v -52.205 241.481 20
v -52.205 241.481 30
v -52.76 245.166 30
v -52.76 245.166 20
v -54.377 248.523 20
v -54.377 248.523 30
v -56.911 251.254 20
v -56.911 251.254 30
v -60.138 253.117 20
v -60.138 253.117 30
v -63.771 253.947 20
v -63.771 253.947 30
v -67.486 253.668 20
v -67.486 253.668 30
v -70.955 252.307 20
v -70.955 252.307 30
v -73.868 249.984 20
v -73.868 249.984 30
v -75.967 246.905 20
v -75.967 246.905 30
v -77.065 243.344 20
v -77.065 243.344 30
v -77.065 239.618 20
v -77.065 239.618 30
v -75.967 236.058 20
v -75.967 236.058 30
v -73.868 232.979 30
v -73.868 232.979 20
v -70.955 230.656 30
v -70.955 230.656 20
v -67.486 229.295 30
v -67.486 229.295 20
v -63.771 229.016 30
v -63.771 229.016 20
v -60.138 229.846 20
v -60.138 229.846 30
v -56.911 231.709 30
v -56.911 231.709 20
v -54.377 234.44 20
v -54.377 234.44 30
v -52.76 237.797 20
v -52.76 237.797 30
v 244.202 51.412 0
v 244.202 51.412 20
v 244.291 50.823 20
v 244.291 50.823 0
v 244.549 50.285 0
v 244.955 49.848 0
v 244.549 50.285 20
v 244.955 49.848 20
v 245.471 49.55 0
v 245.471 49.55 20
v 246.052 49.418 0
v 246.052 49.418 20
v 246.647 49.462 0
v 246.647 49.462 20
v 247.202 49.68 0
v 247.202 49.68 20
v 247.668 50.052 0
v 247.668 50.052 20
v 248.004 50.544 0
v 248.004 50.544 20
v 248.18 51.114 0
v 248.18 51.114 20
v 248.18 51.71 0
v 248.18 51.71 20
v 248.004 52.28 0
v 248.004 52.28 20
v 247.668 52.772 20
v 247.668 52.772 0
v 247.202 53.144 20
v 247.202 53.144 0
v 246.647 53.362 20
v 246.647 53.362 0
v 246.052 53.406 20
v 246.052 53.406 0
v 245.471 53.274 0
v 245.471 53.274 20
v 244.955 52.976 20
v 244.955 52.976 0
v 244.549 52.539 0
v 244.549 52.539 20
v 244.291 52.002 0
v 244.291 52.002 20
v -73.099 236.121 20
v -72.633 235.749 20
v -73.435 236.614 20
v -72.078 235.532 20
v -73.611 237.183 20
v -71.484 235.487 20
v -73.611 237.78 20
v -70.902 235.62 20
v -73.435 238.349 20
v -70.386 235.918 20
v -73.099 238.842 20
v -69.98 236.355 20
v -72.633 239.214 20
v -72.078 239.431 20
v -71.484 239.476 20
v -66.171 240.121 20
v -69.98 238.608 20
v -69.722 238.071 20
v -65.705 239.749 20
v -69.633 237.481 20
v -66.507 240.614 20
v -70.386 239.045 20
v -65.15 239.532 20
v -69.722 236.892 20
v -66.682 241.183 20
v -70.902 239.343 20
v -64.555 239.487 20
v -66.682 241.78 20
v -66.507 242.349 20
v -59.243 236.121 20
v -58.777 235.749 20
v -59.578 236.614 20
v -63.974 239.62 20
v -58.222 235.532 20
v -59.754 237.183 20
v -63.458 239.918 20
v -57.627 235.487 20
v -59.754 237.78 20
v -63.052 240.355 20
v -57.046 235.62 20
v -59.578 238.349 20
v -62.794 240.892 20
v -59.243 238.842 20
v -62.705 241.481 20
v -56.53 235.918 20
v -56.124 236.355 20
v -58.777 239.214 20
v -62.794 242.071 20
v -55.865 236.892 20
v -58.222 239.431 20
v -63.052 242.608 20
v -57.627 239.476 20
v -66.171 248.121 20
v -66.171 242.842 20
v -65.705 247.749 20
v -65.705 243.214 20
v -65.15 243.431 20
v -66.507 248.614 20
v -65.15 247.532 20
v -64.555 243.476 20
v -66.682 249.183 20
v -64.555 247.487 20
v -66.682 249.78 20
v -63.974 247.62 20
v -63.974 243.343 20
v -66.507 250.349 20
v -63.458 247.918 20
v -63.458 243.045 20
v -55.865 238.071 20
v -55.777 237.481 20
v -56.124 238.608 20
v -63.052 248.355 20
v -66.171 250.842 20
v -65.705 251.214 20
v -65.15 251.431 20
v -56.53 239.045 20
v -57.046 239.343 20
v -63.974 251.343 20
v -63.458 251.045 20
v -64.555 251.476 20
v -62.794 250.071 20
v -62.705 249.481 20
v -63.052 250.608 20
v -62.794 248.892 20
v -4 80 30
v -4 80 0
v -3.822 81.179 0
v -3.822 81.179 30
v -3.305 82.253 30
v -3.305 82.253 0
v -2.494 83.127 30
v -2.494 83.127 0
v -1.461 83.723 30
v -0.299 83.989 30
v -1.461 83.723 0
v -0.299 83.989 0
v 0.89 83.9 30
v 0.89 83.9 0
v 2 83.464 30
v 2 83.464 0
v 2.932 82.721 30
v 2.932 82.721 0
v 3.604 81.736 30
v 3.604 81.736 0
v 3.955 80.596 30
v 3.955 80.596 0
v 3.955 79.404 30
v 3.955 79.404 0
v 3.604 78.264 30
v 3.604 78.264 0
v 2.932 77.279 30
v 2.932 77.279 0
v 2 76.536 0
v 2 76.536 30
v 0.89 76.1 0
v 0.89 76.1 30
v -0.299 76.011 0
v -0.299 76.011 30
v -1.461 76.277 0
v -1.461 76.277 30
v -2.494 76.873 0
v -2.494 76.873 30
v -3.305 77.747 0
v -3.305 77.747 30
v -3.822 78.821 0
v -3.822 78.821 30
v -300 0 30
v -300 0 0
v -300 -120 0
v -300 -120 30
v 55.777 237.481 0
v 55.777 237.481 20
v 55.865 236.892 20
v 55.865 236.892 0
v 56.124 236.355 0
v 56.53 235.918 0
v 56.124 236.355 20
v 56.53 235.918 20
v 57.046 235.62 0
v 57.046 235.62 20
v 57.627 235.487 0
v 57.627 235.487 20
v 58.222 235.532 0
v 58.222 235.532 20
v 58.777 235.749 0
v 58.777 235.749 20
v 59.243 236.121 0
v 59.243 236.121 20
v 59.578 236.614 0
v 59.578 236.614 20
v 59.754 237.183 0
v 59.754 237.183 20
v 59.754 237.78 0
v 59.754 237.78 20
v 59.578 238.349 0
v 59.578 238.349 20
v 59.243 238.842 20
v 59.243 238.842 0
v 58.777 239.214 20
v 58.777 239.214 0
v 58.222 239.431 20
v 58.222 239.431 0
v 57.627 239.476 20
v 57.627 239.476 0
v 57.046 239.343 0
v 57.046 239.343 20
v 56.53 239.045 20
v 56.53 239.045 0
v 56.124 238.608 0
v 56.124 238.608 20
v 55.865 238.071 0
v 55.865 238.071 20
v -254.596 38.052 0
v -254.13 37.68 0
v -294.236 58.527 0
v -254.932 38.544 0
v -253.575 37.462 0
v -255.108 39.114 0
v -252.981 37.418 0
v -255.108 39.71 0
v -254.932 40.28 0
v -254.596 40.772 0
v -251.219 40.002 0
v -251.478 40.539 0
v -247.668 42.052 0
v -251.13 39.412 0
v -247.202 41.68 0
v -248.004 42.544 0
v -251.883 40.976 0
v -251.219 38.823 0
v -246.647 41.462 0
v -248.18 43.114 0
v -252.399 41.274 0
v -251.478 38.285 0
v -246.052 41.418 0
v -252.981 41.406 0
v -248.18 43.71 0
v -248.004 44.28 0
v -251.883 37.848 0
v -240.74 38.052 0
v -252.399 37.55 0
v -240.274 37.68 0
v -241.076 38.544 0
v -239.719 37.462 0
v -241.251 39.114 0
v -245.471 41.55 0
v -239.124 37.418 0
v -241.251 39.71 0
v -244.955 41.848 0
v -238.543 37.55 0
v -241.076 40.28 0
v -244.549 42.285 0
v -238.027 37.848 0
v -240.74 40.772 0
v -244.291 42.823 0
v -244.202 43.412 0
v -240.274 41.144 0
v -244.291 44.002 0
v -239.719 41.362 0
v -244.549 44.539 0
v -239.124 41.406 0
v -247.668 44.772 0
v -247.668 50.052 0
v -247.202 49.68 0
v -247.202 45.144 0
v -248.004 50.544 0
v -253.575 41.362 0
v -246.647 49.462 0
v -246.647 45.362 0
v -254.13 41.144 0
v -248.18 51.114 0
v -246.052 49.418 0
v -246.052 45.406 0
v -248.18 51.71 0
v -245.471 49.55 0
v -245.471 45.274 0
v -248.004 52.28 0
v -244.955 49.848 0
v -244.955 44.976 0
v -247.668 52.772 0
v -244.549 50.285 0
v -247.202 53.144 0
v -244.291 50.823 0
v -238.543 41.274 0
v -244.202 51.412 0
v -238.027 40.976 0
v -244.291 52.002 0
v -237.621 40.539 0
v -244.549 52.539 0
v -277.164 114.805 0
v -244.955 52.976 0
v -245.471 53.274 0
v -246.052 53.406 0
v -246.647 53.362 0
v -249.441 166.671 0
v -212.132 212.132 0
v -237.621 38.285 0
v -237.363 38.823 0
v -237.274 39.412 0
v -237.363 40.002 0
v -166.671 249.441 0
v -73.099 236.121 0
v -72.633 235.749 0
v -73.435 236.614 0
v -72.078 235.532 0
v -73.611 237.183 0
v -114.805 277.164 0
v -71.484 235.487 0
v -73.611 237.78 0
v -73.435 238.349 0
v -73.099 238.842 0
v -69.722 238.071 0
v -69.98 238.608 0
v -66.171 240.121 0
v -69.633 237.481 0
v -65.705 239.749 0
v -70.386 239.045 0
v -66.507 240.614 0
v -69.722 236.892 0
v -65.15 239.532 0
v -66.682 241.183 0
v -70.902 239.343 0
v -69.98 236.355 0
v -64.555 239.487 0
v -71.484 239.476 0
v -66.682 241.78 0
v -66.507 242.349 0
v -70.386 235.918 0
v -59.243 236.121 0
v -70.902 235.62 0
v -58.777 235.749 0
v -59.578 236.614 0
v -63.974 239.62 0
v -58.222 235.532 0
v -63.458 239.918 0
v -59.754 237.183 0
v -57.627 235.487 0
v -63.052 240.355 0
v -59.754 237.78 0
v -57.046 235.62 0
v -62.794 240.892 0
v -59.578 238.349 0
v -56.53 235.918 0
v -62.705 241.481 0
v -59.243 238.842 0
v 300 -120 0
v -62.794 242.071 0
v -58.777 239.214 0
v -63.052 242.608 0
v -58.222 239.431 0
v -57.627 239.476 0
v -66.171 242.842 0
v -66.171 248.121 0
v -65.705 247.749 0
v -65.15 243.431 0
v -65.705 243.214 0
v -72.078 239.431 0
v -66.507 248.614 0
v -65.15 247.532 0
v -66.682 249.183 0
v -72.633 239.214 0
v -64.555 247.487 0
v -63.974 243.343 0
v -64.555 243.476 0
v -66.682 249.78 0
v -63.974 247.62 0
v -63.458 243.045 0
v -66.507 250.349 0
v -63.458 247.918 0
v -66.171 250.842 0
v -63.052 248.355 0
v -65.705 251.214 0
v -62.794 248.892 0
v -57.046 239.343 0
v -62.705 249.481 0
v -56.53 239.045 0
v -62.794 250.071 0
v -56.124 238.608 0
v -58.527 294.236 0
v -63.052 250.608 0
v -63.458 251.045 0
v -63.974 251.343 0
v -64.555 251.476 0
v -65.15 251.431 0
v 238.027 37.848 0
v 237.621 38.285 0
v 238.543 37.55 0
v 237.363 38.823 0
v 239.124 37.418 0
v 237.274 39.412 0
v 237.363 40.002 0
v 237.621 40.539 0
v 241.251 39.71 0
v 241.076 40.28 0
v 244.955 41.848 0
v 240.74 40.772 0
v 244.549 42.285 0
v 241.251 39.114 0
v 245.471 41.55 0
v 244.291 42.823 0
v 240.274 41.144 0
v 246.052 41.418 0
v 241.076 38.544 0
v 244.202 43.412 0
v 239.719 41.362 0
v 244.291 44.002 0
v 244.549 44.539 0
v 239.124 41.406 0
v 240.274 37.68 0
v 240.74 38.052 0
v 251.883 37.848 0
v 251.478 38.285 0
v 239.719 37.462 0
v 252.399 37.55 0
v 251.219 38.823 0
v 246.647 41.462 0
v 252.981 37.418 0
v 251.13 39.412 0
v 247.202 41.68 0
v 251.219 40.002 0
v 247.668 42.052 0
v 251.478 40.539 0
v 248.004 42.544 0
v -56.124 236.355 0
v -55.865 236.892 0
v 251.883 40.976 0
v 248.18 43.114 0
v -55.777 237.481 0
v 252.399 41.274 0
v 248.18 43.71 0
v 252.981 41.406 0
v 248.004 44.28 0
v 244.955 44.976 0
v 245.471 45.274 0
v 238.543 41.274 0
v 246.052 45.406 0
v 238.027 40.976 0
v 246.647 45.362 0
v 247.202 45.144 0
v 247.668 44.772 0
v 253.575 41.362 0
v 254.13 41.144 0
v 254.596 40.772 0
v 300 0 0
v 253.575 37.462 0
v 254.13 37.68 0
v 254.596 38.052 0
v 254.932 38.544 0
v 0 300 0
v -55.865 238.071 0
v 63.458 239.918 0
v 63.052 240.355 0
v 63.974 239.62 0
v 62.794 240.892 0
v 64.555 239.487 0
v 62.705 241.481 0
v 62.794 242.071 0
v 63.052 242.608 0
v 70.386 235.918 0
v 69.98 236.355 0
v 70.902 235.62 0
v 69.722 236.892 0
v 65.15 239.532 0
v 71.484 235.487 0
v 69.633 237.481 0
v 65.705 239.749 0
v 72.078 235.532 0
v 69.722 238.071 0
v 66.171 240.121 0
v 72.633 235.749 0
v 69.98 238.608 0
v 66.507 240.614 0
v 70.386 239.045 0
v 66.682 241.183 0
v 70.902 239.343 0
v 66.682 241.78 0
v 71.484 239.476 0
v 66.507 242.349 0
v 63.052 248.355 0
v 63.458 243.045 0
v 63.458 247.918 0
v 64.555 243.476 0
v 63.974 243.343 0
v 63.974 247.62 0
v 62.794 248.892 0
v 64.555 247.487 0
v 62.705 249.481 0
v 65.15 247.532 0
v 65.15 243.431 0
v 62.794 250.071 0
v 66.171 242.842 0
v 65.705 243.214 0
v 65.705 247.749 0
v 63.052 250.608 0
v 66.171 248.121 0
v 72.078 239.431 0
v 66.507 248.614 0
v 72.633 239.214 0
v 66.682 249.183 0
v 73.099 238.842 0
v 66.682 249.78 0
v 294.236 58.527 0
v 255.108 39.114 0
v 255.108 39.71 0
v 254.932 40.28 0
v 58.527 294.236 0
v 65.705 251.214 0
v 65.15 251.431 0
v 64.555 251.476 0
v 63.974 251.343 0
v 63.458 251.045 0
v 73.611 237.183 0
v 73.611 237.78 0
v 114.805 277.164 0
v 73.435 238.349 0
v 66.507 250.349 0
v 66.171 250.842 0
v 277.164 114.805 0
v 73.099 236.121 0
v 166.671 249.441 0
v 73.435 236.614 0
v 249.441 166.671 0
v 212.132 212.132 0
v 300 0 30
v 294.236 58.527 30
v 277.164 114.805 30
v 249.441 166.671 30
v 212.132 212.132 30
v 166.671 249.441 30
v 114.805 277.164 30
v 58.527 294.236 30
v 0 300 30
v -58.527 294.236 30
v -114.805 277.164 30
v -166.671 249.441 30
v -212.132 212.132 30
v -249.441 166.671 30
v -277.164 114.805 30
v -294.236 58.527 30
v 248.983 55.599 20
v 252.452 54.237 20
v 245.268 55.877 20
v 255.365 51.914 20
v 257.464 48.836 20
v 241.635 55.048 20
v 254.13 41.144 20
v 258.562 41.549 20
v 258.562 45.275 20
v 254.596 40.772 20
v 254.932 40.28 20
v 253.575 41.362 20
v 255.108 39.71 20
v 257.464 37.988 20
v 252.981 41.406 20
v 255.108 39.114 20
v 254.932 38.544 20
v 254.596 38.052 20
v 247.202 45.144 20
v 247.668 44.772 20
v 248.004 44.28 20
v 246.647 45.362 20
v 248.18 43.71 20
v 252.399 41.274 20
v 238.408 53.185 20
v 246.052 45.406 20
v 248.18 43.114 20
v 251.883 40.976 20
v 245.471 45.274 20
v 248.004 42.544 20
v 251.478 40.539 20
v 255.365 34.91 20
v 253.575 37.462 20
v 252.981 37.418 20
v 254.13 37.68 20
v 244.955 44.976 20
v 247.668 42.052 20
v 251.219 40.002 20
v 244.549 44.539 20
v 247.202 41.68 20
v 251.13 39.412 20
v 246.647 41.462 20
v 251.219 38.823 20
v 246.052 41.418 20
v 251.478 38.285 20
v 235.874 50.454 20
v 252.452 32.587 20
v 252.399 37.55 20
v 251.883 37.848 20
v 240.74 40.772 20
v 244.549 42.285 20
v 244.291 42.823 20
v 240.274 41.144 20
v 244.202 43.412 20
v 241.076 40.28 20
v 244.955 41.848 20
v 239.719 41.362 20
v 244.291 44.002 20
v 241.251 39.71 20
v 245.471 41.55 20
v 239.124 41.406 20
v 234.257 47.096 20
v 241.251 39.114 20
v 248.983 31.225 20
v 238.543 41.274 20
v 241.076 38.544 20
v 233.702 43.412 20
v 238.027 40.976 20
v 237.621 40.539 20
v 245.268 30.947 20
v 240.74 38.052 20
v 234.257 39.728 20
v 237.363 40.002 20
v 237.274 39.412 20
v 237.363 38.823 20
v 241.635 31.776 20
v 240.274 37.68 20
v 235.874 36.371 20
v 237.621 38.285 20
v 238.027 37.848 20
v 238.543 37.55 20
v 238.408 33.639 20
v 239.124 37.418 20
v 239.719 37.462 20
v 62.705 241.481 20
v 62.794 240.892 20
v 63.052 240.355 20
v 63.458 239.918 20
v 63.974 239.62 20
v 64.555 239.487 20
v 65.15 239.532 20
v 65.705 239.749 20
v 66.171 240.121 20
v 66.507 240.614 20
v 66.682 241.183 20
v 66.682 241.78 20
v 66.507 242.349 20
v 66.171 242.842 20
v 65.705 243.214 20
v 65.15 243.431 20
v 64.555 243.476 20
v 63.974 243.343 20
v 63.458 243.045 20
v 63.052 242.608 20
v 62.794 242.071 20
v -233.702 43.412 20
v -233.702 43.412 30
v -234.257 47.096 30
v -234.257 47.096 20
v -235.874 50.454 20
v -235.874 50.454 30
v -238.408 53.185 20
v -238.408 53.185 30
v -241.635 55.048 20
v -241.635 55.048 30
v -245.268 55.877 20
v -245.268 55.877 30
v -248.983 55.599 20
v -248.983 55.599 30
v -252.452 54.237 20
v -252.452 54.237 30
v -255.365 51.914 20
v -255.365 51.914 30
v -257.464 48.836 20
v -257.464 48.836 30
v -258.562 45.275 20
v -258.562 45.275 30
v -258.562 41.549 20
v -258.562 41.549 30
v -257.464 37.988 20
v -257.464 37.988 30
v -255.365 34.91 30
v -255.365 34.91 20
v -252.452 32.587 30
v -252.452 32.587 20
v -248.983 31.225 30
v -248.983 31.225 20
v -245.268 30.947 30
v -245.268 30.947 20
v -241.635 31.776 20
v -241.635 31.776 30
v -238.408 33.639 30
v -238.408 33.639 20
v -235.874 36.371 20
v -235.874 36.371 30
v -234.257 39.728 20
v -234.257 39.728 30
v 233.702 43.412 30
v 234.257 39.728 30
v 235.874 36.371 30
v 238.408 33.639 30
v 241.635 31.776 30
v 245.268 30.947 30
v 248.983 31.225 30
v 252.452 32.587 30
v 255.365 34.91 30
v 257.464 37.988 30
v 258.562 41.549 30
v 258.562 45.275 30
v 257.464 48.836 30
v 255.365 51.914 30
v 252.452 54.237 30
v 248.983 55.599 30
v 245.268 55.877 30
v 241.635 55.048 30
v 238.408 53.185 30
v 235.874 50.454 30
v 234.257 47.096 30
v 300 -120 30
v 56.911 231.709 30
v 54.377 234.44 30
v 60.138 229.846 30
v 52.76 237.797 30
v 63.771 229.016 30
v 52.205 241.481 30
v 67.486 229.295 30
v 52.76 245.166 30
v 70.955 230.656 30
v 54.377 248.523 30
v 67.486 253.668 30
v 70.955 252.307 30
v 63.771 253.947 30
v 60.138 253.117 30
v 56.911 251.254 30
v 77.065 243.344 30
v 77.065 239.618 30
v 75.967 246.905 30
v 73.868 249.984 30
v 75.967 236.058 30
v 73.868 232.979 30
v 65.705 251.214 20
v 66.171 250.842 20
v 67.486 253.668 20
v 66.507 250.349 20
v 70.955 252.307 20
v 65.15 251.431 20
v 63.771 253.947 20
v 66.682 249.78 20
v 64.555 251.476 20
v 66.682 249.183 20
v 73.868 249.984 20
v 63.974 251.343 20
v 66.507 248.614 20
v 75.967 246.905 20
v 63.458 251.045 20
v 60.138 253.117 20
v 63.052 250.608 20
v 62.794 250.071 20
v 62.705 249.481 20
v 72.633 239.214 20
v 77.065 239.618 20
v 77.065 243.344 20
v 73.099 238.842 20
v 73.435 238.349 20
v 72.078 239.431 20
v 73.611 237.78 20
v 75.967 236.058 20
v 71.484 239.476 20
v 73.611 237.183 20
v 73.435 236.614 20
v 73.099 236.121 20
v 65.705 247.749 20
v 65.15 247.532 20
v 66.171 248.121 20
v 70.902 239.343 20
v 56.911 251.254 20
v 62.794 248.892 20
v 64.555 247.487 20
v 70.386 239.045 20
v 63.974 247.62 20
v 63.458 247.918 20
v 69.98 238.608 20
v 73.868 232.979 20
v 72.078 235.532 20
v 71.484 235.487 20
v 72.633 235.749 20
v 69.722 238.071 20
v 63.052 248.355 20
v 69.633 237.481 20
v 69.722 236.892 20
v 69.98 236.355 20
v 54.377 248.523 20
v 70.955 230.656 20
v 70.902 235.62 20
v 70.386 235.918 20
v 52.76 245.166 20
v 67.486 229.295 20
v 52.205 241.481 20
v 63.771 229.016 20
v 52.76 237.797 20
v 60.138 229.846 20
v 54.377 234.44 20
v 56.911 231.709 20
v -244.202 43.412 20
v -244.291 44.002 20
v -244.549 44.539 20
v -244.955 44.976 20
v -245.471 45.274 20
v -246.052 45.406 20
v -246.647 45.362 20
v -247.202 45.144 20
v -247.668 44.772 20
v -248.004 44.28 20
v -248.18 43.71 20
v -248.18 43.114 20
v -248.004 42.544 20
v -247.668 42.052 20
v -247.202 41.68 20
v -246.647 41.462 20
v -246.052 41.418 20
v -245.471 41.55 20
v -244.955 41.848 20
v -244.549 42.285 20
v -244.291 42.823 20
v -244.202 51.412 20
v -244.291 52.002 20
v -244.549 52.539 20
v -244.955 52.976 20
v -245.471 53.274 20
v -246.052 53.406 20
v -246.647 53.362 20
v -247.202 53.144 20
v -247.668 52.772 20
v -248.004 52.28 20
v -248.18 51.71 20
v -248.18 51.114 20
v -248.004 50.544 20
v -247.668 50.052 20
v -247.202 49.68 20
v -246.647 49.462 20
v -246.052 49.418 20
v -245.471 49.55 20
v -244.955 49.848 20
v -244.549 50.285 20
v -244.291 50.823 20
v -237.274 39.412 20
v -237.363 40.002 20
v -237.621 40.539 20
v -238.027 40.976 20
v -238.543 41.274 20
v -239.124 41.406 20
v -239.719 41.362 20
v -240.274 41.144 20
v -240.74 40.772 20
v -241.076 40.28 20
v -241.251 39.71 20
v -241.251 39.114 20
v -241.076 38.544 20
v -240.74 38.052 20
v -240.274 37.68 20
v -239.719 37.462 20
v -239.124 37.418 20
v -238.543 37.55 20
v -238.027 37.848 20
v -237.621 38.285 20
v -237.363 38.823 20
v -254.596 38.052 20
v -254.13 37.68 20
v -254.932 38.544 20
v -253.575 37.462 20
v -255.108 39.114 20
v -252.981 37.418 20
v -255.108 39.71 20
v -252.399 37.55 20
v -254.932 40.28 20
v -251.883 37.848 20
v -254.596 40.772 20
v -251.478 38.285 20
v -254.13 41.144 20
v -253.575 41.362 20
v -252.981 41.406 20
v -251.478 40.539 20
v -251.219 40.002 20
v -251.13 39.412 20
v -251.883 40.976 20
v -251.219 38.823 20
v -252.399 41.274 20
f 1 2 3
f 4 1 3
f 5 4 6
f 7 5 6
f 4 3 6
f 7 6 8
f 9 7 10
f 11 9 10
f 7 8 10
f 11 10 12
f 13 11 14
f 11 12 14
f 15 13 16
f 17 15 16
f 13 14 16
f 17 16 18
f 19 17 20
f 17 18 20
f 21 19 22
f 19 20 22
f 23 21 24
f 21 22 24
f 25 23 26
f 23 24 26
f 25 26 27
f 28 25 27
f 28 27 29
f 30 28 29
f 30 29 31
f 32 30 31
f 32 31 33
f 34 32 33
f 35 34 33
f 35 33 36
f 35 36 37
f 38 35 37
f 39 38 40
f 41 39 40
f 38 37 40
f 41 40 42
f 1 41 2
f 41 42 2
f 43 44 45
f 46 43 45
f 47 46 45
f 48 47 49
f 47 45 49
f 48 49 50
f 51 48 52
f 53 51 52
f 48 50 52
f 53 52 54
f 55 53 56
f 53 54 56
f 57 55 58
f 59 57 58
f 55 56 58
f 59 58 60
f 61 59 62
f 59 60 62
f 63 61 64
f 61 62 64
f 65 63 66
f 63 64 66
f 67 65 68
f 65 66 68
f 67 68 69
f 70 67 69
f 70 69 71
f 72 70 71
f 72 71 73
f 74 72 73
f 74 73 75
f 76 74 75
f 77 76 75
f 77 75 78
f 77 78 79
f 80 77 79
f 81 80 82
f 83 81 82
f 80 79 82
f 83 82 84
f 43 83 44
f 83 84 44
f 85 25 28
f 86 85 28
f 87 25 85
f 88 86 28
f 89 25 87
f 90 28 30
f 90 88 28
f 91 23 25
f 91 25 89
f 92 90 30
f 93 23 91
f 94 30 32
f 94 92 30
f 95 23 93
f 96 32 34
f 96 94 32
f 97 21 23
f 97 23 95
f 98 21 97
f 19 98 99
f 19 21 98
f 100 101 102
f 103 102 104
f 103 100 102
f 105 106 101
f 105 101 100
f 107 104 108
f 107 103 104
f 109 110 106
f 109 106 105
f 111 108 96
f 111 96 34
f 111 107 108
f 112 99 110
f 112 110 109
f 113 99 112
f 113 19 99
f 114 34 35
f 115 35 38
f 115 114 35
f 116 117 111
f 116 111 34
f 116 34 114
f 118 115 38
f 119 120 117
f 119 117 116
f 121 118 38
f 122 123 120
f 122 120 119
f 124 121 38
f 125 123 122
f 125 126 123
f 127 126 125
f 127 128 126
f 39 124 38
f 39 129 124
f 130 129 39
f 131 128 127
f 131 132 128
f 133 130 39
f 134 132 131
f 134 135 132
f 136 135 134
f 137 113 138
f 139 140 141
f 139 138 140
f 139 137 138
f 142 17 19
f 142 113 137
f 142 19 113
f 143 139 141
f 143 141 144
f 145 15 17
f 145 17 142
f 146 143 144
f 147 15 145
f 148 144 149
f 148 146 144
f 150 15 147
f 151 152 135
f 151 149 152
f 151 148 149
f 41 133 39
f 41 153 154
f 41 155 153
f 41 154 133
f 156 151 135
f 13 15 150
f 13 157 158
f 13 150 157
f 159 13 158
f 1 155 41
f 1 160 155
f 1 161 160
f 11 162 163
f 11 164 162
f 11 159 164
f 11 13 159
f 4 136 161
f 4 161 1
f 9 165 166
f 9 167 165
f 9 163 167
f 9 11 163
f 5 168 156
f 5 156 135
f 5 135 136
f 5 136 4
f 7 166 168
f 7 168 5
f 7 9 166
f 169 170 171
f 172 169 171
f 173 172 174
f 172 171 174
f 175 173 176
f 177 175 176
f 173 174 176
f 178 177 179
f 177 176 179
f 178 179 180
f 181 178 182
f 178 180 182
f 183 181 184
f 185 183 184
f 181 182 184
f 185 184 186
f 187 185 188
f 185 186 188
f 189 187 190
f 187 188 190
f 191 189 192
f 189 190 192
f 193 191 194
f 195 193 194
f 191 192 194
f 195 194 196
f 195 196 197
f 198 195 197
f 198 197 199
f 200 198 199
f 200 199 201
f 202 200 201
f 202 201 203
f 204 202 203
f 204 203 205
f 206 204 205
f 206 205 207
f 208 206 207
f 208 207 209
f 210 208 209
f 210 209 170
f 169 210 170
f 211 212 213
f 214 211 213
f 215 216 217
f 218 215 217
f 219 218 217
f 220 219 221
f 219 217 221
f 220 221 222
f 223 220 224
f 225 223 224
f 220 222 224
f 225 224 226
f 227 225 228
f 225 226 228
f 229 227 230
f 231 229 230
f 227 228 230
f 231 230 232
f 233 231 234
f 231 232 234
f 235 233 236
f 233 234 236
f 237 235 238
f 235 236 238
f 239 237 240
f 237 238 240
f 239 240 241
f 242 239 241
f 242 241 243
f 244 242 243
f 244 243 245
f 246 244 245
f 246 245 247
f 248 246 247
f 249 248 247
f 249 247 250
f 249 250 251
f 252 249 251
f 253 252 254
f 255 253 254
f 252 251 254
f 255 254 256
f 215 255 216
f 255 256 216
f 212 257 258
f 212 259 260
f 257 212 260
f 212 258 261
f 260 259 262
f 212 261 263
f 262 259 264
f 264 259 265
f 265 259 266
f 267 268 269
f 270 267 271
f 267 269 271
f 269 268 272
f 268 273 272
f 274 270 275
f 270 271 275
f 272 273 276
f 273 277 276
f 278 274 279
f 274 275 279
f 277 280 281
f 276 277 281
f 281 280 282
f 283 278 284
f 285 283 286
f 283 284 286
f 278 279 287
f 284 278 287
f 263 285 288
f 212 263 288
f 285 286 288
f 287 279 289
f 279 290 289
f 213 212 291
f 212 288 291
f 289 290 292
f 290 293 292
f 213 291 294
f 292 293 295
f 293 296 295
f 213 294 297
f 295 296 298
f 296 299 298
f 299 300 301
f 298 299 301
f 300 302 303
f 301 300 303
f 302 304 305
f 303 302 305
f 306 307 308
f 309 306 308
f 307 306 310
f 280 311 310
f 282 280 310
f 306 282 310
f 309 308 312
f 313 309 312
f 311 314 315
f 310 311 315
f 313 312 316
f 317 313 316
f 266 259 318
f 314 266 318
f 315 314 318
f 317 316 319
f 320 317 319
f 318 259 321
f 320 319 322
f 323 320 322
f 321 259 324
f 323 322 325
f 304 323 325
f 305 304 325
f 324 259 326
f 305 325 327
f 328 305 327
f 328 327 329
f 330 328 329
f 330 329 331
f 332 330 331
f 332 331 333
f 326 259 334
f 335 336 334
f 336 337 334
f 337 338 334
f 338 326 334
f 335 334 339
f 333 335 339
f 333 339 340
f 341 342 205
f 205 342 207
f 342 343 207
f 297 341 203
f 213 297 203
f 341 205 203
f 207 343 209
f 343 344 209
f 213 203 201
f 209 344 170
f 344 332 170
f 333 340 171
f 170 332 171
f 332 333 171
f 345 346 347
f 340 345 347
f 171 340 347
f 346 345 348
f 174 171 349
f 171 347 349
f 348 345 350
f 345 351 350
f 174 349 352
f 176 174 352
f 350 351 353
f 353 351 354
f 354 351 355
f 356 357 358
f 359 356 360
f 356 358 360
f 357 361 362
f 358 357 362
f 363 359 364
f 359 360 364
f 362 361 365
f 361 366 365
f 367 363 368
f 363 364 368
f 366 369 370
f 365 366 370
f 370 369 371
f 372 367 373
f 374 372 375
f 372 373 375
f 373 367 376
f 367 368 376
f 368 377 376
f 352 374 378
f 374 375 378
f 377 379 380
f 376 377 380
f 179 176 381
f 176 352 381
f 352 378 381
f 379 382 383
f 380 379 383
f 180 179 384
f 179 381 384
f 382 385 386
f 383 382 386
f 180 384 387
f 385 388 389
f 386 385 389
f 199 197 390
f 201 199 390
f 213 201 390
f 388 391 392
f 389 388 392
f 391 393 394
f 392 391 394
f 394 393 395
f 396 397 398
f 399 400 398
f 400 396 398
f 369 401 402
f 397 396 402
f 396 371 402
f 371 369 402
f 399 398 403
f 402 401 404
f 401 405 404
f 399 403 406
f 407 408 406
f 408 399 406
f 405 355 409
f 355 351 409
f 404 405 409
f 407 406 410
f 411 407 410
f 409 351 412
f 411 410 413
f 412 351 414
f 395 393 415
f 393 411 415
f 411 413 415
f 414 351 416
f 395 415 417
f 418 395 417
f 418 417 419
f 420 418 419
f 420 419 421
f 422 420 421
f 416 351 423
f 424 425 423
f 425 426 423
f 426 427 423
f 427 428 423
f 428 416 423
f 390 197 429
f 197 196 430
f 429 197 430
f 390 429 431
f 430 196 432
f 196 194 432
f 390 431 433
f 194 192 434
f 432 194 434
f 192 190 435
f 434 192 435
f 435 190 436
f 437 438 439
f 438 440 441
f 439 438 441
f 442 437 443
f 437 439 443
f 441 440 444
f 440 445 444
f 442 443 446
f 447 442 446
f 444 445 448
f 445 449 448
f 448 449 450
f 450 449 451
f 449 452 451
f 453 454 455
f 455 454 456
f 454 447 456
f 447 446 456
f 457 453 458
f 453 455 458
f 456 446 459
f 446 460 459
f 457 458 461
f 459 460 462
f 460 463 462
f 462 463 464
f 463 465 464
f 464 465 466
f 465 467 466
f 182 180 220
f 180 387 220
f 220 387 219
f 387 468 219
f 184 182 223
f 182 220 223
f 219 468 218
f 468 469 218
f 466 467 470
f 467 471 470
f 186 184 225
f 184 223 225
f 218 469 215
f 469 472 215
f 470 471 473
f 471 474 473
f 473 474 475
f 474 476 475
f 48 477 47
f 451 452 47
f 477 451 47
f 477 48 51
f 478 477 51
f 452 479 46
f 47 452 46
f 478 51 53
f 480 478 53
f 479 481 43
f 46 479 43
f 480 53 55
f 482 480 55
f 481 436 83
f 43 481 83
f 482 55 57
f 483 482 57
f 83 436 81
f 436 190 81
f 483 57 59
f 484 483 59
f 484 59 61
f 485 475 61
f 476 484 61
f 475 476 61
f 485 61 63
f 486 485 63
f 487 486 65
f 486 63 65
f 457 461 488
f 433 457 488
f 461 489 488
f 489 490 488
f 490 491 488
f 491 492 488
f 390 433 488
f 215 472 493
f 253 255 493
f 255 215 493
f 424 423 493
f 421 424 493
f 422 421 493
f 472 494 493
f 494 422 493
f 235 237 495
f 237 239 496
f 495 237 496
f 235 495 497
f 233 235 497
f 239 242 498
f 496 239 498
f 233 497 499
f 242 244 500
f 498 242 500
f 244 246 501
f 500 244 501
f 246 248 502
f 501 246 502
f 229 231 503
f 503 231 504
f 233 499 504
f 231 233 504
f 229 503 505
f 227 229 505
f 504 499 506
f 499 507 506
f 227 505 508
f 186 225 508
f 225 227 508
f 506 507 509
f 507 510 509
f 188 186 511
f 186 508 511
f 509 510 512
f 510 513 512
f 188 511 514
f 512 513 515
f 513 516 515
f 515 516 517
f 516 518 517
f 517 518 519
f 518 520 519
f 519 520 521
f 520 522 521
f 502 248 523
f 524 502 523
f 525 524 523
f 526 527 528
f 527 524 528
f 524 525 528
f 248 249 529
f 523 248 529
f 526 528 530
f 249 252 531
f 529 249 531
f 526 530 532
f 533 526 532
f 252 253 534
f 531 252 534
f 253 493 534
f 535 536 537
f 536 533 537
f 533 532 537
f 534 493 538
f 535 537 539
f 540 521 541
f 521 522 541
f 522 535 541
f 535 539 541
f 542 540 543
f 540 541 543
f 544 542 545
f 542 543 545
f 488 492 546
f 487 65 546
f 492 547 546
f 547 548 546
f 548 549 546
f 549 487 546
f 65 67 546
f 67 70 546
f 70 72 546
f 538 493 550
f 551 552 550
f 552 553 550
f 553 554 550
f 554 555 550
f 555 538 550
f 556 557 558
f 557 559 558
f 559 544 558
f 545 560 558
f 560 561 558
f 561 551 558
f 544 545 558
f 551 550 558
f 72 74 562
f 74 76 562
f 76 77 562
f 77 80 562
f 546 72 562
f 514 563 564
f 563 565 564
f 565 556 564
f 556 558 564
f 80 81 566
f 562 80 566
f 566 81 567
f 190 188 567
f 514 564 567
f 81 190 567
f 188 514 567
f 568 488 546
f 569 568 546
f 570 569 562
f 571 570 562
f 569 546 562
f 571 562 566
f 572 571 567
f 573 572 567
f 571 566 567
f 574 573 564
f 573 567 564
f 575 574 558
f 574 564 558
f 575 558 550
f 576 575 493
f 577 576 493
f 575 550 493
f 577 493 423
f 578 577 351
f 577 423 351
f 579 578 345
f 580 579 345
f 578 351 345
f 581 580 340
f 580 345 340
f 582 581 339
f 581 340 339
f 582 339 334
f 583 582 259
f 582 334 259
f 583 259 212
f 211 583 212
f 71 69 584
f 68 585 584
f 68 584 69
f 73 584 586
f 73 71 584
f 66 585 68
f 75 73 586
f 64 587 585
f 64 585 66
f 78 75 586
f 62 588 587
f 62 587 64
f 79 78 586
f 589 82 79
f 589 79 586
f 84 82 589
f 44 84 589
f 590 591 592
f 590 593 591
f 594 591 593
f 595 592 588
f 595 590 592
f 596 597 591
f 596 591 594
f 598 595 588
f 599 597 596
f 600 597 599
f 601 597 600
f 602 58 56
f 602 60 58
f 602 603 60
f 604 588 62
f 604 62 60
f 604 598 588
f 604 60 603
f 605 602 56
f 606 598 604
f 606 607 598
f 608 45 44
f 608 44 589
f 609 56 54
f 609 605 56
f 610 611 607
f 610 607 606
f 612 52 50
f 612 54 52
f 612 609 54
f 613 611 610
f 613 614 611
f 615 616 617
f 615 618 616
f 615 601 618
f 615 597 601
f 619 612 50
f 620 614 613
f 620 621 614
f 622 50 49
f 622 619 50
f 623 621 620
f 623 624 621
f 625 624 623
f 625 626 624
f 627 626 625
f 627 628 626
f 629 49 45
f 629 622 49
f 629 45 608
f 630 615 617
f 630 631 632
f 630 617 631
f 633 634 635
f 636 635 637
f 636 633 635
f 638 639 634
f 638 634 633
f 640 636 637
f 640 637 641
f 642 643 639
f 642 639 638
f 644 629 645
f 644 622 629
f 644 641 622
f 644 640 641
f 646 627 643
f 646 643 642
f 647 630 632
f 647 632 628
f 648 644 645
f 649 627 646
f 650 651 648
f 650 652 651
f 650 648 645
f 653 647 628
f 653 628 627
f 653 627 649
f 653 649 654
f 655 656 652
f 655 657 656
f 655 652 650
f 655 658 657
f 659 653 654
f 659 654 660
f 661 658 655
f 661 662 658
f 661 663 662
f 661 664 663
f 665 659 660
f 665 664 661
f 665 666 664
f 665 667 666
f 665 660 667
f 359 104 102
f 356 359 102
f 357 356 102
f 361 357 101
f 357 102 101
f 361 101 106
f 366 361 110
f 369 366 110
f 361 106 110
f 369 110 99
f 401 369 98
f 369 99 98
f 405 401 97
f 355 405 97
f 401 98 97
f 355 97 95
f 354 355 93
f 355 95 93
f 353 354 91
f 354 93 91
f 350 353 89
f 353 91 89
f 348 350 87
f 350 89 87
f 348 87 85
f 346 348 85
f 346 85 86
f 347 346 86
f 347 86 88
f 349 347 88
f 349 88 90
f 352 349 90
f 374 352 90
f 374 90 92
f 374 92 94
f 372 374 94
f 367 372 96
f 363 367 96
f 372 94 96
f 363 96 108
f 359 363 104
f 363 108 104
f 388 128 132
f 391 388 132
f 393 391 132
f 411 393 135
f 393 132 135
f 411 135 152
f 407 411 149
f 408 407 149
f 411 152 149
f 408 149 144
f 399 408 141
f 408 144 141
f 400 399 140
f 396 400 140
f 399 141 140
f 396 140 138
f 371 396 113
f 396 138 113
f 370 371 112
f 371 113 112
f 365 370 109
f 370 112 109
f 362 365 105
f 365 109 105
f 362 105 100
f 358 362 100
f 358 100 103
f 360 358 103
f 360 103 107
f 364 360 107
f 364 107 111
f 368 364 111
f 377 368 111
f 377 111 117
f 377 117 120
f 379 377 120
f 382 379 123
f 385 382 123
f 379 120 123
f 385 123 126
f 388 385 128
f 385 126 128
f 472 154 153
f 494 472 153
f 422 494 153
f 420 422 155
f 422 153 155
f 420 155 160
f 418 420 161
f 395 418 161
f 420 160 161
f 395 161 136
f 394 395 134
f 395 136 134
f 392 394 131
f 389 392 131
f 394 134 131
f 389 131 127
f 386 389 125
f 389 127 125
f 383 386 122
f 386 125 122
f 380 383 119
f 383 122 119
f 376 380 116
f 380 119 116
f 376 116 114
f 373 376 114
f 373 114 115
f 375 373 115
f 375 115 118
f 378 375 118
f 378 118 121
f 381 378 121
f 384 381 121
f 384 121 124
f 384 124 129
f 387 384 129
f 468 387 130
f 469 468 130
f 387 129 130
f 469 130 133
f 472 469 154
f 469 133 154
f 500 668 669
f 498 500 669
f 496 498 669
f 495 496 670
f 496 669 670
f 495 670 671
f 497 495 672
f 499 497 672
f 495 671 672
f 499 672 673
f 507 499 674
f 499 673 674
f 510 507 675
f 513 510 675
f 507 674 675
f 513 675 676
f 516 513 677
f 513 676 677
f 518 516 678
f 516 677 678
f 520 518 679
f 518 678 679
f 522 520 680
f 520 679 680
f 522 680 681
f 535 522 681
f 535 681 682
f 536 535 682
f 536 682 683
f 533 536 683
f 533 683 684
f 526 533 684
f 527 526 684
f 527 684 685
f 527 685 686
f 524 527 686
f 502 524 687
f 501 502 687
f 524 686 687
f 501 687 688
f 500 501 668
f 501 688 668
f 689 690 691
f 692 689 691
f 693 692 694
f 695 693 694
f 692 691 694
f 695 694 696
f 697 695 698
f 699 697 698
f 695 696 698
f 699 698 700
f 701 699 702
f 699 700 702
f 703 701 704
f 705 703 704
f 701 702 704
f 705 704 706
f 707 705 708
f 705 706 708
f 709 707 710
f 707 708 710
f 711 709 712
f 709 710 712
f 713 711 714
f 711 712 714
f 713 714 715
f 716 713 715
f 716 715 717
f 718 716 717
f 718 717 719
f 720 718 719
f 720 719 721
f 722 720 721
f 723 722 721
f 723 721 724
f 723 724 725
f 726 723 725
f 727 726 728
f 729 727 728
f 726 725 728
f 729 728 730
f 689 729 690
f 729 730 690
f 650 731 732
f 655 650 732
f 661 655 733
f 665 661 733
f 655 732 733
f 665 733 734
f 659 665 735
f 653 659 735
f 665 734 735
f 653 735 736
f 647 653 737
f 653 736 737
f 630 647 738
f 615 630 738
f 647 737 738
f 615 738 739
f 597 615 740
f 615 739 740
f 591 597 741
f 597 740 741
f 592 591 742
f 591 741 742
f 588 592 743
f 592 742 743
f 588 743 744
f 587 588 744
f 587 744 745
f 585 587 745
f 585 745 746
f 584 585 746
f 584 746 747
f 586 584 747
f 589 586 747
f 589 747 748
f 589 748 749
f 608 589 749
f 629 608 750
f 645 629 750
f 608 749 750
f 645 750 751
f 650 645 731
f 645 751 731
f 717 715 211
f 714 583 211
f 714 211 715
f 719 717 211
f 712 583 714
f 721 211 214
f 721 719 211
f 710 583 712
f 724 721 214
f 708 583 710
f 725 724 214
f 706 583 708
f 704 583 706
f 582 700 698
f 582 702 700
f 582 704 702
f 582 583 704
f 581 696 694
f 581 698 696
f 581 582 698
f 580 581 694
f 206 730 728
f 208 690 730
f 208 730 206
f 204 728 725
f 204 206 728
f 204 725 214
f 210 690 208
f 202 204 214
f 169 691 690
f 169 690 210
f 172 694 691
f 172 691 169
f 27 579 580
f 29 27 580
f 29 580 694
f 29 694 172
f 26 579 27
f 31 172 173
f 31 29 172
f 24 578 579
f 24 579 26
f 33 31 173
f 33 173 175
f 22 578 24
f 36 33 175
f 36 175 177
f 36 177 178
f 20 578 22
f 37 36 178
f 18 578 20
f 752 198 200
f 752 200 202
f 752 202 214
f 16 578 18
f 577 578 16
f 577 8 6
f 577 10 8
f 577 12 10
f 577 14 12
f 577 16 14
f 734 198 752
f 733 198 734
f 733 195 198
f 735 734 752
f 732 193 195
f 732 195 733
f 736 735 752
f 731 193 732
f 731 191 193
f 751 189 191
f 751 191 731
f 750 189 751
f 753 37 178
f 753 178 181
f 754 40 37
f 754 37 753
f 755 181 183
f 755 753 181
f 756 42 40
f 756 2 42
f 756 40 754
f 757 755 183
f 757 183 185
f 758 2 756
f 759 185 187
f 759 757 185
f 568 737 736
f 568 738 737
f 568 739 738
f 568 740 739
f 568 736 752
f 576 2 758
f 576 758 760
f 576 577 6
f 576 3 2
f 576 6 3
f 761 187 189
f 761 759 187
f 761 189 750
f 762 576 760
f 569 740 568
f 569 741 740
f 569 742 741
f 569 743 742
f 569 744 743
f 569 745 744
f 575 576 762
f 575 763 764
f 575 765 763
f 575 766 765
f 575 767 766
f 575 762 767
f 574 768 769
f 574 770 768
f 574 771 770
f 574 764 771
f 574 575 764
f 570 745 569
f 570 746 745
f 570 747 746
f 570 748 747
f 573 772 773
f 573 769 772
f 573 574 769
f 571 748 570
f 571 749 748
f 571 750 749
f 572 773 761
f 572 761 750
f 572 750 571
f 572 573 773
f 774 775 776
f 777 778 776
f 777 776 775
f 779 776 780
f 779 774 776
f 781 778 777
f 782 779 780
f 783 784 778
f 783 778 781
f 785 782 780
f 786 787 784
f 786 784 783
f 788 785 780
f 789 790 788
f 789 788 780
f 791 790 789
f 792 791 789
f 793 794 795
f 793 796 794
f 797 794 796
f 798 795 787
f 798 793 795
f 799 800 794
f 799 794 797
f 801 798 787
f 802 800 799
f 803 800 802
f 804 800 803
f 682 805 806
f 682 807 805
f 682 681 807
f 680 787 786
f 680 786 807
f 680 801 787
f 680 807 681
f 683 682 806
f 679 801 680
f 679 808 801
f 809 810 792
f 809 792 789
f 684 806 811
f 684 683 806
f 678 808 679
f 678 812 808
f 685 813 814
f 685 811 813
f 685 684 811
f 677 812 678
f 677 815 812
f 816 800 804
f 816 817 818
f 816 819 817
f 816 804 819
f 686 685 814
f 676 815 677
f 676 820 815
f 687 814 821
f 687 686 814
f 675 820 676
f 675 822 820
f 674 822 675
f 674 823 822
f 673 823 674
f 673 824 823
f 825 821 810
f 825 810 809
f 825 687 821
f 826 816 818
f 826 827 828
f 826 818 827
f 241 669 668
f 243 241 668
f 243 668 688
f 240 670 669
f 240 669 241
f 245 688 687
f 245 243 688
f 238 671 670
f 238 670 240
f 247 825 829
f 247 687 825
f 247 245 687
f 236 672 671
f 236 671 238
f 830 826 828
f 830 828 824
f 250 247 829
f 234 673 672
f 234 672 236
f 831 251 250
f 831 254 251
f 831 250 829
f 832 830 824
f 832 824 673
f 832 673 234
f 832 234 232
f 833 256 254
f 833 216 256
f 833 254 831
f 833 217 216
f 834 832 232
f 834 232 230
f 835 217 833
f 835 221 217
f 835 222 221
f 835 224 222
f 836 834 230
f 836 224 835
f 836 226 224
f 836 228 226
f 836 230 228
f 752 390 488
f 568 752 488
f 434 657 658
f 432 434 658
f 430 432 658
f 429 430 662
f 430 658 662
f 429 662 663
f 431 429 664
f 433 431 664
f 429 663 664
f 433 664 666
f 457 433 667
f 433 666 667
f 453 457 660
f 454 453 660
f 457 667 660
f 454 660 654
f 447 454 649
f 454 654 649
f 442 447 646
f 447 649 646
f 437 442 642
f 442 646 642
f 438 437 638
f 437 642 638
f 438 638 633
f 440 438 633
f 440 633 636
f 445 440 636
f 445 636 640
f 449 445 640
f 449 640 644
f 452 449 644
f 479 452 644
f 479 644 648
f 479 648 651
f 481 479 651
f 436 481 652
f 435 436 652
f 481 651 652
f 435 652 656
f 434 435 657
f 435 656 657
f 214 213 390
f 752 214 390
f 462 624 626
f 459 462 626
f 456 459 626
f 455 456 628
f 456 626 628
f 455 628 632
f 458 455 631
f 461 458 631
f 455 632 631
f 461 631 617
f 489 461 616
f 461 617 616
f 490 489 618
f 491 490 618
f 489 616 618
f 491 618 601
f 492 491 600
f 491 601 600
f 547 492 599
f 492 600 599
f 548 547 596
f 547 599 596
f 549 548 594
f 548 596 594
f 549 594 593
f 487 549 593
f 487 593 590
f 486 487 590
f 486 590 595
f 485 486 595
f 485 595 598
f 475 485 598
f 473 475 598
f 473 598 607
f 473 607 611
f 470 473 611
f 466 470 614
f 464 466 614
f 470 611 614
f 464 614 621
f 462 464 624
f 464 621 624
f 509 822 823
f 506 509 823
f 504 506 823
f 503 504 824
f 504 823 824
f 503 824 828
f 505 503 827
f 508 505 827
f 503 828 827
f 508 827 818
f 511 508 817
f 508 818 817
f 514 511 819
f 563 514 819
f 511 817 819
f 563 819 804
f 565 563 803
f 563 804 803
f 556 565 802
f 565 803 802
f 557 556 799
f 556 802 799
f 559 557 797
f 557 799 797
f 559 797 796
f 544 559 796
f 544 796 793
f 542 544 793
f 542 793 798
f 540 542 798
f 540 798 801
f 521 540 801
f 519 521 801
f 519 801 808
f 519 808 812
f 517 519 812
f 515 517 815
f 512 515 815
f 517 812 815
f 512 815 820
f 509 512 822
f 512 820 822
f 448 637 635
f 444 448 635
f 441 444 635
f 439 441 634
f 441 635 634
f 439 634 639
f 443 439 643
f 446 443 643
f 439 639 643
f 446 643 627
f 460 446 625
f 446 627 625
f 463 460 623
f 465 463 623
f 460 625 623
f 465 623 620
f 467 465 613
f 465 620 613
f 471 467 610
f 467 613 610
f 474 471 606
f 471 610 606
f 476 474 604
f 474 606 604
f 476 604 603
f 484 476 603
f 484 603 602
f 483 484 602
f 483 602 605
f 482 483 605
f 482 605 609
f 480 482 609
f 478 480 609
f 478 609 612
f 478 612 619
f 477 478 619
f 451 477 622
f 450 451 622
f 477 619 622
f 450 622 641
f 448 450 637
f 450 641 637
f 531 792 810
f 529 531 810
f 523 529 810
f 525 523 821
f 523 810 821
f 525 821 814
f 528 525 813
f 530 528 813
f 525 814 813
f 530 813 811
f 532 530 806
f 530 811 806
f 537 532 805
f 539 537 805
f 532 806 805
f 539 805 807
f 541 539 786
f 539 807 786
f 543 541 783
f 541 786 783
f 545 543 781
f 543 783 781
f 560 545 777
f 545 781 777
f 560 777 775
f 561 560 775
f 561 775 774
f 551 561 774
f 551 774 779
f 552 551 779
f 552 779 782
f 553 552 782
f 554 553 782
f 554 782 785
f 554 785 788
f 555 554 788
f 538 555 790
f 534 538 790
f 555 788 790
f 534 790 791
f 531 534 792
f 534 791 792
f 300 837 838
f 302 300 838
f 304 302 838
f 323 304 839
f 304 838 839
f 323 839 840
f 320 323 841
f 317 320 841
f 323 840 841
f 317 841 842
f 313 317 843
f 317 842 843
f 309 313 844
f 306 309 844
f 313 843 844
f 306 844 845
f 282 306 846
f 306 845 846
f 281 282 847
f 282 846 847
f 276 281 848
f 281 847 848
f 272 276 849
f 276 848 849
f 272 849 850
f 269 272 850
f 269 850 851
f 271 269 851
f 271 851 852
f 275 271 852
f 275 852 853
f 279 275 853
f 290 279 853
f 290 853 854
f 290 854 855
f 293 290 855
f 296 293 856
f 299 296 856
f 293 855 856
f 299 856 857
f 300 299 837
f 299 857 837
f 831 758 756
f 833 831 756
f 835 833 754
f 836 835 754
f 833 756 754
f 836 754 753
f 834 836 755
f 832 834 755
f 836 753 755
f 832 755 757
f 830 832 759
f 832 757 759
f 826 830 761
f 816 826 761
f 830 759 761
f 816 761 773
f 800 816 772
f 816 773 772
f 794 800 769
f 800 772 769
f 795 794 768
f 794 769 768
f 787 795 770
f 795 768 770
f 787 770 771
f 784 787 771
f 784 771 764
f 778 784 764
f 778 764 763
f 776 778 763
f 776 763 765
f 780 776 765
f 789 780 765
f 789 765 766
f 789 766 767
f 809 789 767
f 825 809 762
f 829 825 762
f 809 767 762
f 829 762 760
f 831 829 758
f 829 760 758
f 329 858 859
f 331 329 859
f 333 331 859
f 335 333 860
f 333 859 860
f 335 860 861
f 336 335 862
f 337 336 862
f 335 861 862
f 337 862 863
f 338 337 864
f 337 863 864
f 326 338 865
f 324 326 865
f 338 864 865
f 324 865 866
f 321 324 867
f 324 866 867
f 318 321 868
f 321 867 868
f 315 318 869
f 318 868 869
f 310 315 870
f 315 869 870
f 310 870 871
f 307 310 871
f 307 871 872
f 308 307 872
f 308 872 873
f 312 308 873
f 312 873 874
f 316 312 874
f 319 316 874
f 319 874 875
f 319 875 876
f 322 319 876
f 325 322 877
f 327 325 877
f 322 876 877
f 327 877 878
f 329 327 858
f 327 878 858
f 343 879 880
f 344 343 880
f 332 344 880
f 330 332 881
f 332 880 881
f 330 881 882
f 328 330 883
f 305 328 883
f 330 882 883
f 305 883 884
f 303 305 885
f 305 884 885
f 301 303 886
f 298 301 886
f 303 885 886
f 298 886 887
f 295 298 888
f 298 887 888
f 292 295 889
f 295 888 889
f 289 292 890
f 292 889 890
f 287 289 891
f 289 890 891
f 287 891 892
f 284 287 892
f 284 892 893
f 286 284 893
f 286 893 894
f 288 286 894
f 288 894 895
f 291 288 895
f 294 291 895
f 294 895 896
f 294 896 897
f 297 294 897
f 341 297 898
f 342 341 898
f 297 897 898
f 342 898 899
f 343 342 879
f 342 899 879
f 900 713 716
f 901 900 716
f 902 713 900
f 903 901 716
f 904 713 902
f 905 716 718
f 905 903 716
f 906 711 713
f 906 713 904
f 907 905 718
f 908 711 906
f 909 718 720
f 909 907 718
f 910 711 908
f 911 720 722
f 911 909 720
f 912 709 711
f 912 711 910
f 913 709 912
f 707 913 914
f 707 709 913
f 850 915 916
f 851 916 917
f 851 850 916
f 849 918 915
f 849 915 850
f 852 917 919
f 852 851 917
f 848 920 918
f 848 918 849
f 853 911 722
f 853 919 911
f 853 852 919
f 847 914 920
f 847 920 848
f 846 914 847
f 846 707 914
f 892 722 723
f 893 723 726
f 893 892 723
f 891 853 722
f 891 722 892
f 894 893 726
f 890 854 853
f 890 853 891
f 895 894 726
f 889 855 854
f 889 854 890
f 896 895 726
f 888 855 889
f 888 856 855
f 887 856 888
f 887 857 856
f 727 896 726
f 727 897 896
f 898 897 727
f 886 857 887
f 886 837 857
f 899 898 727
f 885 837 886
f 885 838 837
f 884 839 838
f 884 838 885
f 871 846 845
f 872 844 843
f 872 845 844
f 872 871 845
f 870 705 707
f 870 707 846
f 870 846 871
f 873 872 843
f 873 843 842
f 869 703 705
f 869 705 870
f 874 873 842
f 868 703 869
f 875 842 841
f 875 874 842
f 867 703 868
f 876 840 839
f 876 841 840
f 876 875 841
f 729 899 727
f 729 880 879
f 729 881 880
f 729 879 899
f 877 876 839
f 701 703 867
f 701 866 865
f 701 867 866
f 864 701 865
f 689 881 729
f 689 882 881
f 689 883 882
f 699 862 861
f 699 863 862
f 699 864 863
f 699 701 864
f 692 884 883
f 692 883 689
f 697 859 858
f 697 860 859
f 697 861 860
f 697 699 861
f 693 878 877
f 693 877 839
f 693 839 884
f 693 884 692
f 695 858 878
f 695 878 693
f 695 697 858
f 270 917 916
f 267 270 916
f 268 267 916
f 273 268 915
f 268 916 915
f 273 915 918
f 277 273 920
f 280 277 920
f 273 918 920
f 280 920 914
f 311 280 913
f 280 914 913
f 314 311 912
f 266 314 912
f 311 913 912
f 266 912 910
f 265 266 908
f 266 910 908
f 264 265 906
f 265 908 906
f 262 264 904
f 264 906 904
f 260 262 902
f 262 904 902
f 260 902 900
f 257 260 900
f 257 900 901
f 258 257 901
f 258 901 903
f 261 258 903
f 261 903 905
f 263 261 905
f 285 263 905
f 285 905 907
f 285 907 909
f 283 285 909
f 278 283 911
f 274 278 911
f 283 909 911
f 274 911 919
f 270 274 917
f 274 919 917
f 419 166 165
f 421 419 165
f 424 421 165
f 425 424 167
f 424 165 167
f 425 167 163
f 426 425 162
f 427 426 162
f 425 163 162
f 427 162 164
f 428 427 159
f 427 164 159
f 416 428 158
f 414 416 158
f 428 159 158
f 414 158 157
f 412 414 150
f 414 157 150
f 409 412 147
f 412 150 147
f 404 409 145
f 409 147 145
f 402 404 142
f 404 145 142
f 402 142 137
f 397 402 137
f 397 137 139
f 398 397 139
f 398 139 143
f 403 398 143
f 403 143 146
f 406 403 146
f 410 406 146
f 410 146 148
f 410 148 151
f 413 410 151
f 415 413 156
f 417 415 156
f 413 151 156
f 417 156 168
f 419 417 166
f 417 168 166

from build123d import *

# Parameters (mm, degrees)
EXTRUDE_1_DEPTH     = 30
SKETCH_2_R          = 12.5
CUT_EXTRUDE_1_DEPTH = 10
SKETCH_4_R          = 2
CUT_EXTRUDE_2_DEPTH = 20
SKETCH_6_R          = 4
CUT_EXTRUDE_3_DEPTH = 59


with BuildPart() as part:
    # 草图1 → 凸台-拉伸1 (new body)
    with BuildSketch(Plane.XY):
        with BuildLine():
            Line((-300, 0), (-300, -120))
            Line((-300, -120), (300, -120))
            Line((300, -120), (300, 0))
            ThreePointArc((300, 0), (0, 300), (-300, 0))
        make_face()
    extrude(amount=EXTRUDE_1_DEPTH)

    # 草图2 → 切除-拉伸1 (cut)
    with BuildSketch(Plane.XY.offset(30)):
        with Locations((-246.201938253, 43.412044417)):
            Circle(SKETCH_2_R)
        with Locations((-64.704761276, 241.481456572)):
            Circle(SKETCH_2_R)
        with Locations(Location((246.201938253, 43.412044417, 0), (0, 0, 180))):
            Circle(SKETCH_2_R)
        with Locations(Location((64.704761276, 241.481456572, 0), (0, 0, 180))):
            Circle(SKETCH_2_R)
    extrude(amount=-CUT_EXTRUDE_1_DEPTH, mode=Mode.SUBTRACT)

    # 草图4 → 切除-拉伸2 (cut)
    with BuildSketch(Plane.XY.offset(20)):
        with Locations((-246.201938253, 43.412044417)):
            Circle(SKETCH_4_R)
        with Locations((-246.201938253, 51.412044417)):
            Circle(SKETCH_4_R)
        with Locations((-253.130141483, 39.412044417)):
            Circle(SKETCH_4_R)
        with Locations((-239.273735023, 39.412044417)):
            Circle(SKETCH_4_R)
        with Locations((-64.704761276, 249.481456572)):
            Circle(SKETCH_4_R)
        with Locations((-71.632964506, 237.481456572)):
            Circle(SKETCH_4_R)
        with Locations((-57.776558045, 237.481456572)):
            Circle(SKETCH_4_R)
        with Locations((-64.704761276, 241.481456572)):
            Circle(SKETCH_4_R)
        with Locations(Location((64.704761276, 241.481456572, 0), (0, 0, 180))):
            Circle(SKETCH_4_R)
        with Locations(Location((57.776558045, 237.481456572, 0), (0, 0, 180))):
            Circle(SKETCH_4_R)
        with Locations(Location((71.632964506, 237.481456572, 0), (0, 0, 180))):
            Circle(SKETCH_4_R)
        with Locations(Location((64.704761276, 249.481456572, 0), (0, 0, 180))):
            Circle(SKETCH_4_R)
        with Locations(Location((239.273735023, 39.412044417, 0), (0, 0, 180))):
            Circle(SKETCH_4_R)
        with Locations(Location((253.130141483, 39.412044417, 0), (0, 0, 180))):
            Circle(SKETCH_4_R)
        with Locations(Location((246.201938253, 51.412044417, 0), (0, 0, 180))):
            Circle(SKETCH_4_R)
        with Locations(Location((246.201938253, 43.412044417, 0), (0, 0, 180))):
            Circle(SKETCH_4_R)
    extrude(amount=-CUT_EXTRUDE_2_DEPTH, mode=Mode.SUBTRACT)

    # 草图6 → 切除-拉伸3 (cut)
    with BuildSketch(Plane(origin=(0, 0, 0), x_dir=(-1, 0, 0), z_dir=(0, 0, -1))):
        with Locations((0, 80)):
            Circle(SKETCH_6_R)
    extrude(amount=-CUT_EXTRUDE_3_DEPTH, mode=Mode.SUBTRACT)


solid = part.part
